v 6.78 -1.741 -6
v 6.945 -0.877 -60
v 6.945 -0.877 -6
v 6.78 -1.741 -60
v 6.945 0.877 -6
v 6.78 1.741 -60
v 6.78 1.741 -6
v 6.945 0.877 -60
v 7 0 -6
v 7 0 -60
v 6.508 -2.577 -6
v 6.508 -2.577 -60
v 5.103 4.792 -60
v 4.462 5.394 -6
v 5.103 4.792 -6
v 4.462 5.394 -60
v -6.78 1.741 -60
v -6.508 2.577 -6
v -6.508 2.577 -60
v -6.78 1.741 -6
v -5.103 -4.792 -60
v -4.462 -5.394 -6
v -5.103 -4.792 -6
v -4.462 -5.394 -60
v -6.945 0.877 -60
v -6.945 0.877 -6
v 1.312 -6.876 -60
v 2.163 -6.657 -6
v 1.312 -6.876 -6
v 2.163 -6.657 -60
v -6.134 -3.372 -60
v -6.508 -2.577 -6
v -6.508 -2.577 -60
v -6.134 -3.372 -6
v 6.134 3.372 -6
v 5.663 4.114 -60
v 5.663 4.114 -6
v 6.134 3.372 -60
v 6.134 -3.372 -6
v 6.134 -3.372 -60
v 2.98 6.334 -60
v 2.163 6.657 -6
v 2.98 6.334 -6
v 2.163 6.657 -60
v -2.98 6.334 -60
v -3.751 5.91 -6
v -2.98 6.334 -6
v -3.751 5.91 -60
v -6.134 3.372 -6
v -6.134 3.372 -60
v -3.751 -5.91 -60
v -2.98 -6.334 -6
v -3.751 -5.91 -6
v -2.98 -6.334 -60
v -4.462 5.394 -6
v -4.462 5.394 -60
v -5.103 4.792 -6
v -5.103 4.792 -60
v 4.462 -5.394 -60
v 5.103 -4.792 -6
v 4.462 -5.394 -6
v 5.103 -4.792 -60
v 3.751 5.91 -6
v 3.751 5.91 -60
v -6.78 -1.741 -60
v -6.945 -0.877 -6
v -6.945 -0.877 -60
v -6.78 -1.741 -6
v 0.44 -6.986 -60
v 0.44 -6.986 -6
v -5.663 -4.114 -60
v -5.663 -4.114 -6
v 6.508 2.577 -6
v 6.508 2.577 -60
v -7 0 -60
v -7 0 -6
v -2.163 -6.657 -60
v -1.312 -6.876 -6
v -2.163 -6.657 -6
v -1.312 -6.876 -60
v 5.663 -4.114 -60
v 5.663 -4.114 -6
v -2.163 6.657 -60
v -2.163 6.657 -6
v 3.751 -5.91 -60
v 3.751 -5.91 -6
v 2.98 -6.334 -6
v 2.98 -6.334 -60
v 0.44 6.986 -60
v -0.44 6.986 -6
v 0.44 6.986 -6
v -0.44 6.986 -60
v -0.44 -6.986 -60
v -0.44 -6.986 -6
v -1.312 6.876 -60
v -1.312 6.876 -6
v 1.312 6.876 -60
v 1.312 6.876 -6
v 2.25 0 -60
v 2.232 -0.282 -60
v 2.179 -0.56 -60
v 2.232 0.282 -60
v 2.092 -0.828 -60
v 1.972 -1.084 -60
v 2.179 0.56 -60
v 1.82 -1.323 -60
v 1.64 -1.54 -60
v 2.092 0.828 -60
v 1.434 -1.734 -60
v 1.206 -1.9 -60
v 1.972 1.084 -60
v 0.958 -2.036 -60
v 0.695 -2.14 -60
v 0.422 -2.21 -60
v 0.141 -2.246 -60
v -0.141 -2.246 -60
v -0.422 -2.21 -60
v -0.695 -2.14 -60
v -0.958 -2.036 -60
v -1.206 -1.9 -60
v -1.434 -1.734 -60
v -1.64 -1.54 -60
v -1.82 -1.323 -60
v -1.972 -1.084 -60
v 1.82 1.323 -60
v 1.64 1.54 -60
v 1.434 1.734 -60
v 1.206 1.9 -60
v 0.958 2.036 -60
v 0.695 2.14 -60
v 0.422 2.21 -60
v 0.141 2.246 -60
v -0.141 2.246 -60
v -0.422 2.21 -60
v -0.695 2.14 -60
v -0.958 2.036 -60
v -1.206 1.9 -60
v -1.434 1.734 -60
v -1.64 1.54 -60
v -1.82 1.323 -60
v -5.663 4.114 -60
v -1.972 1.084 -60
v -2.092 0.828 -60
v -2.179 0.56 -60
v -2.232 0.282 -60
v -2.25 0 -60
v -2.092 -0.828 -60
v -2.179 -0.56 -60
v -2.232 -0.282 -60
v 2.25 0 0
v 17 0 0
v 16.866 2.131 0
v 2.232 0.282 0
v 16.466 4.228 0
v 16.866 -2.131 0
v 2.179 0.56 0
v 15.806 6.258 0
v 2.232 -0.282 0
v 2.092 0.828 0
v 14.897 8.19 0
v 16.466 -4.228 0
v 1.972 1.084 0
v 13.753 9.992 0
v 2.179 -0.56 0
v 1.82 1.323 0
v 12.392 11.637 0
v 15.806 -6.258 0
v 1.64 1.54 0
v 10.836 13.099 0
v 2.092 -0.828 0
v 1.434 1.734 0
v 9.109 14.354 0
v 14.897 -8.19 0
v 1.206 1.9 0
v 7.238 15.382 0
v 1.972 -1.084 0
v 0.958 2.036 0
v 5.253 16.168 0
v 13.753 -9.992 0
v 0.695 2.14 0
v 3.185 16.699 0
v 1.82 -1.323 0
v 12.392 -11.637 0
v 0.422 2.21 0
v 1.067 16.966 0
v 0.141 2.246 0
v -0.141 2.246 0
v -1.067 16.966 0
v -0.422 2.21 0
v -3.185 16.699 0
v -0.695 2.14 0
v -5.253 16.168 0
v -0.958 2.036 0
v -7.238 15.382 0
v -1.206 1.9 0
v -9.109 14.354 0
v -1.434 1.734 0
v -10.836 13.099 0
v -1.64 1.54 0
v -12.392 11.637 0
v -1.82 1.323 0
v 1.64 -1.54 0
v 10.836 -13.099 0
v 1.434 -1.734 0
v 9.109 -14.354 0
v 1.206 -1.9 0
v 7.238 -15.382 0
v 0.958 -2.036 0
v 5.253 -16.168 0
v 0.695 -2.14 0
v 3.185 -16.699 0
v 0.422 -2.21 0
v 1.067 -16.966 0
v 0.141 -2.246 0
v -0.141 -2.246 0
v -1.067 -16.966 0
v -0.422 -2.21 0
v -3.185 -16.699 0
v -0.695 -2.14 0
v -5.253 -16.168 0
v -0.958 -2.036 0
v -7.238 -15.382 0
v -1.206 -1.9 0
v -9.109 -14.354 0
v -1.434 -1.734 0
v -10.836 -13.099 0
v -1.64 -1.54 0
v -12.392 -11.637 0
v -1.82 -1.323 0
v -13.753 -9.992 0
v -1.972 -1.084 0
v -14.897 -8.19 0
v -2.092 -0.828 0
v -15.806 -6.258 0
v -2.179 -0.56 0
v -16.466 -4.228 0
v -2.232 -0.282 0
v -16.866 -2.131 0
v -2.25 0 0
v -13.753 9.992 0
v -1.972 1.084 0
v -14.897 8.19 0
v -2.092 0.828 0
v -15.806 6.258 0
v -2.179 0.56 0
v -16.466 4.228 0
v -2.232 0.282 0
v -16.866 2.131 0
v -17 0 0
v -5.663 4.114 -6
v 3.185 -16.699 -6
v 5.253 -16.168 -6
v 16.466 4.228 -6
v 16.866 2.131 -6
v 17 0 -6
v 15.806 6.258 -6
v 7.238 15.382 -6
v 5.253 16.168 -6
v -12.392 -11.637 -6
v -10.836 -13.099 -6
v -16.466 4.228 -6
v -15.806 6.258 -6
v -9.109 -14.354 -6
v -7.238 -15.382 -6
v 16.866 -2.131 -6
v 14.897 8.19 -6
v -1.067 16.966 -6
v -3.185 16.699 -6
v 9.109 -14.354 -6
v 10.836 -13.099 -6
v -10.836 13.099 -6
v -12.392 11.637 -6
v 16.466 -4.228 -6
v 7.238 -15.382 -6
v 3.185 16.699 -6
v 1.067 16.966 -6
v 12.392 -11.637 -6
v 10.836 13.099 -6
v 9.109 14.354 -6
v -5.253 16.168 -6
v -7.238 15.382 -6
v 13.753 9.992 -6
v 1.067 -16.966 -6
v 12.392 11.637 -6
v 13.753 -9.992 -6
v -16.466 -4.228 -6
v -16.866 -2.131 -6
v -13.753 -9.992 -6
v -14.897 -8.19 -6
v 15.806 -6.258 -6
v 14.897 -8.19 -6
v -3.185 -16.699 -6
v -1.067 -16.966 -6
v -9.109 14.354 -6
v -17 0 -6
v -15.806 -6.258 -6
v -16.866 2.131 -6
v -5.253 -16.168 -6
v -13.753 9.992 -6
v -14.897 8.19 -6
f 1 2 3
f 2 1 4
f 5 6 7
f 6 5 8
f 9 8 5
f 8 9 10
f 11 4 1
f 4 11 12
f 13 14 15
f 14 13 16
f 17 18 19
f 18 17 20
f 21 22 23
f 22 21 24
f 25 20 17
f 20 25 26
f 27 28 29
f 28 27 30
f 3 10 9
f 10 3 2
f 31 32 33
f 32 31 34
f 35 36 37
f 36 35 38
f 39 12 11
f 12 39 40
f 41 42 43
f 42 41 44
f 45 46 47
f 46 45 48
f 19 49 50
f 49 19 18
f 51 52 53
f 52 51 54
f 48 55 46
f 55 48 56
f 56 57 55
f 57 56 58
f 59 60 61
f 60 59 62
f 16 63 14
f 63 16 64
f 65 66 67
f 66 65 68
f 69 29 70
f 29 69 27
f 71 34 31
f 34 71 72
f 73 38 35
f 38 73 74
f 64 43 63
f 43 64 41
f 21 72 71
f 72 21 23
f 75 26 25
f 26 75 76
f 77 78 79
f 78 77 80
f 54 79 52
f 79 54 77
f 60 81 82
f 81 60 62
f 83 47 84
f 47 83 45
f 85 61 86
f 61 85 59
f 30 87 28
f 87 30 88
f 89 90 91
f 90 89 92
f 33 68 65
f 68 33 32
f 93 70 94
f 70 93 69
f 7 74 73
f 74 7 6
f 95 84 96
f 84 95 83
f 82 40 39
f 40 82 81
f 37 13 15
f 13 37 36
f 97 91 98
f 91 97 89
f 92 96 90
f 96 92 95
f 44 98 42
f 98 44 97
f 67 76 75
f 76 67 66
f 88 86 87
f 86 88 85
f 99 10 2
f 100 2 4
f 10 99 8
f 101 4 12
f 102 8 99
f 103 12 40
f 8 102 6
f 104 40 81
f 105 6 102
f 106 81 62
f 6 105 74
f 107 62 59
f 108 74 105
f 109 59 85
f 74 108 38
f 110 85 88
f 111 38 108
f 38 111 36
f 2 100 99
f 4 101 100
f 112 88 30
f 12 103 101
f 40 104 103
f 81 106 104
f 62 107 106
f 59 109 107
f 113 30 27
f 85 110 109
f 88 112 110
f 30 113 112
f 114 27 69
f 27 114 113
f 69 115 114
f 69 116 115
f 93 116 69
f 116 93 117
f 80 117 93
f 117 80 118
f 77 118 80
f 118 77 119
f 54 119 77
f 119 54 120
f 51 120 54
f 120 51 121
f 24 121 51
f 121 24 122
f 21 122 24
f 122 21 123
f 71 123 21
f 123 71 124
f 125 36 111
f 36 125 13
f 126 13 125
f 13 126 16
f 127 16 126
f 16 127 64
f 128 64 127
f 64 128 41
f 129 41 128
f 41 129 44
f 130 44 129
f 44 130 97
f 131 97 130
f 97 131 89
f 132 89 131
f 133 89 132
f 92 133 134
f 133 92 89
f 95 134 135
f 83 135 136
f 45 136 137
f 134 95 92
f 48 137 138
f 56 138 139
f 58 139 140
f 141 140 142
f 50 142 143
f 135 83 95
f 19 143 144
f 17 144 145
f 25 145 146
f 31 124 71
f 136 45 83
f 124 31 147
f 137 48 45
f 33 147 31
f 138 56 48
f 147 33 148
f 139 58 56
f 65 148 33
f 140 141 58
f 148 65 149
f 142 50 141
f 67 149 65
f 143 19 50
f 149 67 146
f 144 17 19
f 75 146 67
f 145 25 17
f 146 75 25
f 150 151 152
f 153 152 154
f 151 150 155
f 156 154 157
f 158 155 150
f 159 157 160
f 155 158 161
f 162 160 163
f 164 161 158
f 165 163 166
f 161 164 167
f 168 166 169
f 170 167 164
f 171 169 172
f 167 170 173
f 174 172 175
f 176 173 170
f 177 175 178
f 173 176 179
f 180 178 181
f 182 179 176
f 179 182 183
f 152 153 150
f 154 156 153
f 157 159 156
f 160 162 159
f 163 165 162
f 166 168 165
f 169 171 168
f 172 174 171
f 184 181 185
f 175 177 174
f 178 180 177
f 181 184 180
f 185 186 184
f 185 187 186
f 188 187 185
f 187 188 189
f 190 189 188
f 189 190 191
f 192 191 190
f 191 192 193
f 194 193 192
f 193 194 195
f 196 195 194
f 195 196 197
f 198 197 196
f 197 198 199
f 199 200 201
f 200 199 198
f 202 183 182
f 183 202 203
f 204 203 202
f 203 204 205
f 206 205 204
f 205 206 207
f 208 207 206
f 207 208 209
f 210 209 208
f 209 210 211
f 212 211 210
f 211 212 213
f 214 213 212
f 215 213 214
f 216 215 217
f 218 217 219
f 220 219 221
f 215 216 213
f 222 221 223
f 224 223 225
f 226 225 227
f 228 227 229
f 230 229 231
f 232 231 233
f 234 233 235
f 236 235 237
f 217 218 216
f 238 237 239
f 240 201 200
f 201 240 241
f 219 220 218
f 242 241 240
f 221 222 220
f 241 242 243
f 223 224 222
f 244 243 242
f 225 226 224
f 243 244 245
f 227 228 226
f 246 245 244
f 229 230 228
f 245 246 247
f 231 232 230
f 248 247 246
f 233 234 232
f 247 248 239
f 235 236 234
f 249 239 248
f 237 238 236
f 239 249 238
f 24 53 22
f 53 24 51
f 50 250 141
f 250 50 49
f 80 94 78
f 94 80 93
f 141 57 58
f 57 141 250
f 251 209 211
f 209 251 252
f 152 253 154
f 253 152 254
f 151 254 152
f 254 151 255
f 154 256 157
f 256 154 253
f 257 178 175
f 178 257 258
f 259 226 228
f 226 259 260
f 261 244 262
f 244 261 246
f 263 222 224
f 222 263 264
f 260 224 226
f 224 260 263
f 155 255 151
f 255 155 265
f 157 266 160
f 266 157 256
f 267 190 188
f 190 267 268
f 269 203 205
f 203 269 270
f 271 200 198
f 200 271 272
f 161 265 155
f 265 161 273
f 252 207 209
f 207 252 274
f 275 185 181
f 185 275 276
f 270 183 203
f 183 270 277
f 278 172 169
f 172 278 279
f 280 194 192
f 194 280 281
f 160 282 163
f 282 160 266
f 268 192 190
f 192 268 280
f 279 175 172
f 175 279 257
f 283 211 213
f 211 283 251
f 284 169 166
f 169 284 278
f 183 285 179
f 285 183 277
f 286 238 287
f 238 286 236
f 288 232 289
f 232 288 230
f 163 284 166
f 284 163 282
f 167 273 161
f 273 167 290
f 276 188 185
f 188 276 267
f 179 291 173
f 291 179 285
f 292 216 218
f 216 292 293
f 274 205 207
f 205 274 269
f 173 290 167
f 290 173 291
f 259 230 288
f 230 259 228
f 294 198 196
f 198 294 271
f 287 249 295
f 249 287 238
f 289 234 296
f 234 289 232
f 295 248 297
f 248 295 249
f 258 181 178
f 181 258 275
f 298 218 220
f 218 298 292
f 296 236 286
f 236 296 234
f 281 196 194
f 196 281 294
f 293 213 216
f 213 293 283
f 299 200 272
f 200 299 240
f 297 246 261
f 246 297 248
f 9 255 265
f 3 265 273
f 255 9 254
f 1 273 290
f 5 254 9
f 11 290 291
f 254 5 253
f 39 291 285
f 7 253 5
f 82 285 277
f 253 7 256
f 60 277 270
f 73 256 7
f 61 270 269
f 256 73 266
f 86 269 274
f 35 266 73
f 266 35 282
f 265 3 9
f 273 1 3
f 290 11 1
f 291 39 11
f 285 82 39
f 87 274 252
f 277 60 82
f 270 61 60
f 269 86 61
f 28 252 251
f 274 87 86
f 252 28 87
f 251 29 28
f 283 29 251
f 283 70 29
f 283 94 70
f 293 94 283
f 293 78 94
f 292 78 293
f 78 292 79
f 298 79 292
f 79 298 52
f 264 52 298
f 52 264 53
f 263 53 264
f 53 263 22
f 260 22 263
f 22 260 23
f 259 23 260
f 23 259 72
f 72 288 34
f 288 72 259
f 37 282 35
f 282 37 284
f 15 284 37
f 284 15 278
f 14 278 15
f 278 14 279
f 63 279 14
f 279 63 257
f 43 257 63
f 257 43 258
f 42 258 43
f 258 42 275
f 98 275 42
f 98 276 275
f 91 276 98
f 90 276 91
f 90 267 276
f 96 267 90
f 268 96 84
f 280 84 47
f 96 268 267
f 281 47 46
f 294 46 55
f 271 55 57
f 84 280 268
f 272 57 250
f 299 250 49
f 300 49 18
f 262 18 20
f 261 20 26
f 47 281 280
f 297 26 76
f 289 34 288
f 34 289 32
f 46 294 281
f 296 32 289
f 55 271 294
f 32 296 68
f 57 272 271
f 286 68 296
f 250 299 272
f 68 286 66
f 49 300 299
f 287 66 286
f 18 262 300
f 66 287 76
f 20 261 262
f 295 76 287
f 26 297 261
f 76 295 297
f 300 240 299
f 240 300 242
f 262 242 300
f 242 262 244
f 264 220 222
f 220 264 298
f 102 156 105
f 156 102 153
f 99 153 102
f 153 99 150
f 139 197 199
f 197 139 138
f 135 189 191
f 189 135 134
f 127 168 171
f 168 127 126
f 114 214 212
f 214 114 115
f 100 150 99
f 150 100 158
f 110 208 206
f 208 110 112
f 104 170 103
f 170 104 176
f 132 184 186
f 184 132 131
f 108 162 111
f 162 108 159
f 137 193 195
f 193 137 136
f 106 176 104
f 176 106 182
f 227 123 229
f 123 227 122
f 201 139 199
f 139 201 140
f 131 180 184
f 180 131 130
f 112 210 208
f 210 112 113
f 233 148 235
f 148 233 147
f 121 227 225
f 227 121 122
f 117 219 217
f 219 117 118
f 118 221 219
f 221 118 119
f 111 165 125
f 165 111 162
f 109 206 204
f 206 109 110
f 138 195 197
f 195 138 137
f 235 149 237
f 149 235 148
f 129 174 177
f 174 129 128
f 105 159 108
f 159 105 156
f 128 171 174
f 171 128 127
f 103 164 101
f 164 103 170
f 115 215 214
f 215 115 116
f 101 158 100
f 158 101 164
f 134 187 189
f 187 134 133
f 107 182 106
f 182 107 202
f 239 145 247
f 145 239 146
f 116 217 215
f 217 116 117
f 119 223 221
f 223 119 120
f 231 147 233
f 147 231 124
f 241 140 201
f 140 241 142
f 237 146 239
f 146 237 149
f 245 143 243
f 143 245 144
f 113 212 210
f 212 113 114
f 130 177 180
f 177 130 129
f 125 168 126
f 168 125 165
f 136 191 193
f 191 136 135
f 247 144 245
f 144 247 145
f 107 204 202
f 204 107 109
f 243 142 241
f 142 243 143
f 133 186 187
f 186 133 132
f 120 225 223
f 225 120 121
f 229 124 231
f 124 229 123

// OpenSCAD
$fn = 50;


difference() {
	union() {
		translate(v = [0, 0, -60.0000000000]) {
			cylinder(h = 60, r = 7.0000000000);
		}
		translate(v = [0, 0, -6.0000000000]) {
			cylinder(h = 6, r = 17.0000000000);
		}
	}
	union() {
		#translate(v = [0, 0, -60]) {
			cylinder(h = 60, r = 2.2500000000);
		}
	}
}
